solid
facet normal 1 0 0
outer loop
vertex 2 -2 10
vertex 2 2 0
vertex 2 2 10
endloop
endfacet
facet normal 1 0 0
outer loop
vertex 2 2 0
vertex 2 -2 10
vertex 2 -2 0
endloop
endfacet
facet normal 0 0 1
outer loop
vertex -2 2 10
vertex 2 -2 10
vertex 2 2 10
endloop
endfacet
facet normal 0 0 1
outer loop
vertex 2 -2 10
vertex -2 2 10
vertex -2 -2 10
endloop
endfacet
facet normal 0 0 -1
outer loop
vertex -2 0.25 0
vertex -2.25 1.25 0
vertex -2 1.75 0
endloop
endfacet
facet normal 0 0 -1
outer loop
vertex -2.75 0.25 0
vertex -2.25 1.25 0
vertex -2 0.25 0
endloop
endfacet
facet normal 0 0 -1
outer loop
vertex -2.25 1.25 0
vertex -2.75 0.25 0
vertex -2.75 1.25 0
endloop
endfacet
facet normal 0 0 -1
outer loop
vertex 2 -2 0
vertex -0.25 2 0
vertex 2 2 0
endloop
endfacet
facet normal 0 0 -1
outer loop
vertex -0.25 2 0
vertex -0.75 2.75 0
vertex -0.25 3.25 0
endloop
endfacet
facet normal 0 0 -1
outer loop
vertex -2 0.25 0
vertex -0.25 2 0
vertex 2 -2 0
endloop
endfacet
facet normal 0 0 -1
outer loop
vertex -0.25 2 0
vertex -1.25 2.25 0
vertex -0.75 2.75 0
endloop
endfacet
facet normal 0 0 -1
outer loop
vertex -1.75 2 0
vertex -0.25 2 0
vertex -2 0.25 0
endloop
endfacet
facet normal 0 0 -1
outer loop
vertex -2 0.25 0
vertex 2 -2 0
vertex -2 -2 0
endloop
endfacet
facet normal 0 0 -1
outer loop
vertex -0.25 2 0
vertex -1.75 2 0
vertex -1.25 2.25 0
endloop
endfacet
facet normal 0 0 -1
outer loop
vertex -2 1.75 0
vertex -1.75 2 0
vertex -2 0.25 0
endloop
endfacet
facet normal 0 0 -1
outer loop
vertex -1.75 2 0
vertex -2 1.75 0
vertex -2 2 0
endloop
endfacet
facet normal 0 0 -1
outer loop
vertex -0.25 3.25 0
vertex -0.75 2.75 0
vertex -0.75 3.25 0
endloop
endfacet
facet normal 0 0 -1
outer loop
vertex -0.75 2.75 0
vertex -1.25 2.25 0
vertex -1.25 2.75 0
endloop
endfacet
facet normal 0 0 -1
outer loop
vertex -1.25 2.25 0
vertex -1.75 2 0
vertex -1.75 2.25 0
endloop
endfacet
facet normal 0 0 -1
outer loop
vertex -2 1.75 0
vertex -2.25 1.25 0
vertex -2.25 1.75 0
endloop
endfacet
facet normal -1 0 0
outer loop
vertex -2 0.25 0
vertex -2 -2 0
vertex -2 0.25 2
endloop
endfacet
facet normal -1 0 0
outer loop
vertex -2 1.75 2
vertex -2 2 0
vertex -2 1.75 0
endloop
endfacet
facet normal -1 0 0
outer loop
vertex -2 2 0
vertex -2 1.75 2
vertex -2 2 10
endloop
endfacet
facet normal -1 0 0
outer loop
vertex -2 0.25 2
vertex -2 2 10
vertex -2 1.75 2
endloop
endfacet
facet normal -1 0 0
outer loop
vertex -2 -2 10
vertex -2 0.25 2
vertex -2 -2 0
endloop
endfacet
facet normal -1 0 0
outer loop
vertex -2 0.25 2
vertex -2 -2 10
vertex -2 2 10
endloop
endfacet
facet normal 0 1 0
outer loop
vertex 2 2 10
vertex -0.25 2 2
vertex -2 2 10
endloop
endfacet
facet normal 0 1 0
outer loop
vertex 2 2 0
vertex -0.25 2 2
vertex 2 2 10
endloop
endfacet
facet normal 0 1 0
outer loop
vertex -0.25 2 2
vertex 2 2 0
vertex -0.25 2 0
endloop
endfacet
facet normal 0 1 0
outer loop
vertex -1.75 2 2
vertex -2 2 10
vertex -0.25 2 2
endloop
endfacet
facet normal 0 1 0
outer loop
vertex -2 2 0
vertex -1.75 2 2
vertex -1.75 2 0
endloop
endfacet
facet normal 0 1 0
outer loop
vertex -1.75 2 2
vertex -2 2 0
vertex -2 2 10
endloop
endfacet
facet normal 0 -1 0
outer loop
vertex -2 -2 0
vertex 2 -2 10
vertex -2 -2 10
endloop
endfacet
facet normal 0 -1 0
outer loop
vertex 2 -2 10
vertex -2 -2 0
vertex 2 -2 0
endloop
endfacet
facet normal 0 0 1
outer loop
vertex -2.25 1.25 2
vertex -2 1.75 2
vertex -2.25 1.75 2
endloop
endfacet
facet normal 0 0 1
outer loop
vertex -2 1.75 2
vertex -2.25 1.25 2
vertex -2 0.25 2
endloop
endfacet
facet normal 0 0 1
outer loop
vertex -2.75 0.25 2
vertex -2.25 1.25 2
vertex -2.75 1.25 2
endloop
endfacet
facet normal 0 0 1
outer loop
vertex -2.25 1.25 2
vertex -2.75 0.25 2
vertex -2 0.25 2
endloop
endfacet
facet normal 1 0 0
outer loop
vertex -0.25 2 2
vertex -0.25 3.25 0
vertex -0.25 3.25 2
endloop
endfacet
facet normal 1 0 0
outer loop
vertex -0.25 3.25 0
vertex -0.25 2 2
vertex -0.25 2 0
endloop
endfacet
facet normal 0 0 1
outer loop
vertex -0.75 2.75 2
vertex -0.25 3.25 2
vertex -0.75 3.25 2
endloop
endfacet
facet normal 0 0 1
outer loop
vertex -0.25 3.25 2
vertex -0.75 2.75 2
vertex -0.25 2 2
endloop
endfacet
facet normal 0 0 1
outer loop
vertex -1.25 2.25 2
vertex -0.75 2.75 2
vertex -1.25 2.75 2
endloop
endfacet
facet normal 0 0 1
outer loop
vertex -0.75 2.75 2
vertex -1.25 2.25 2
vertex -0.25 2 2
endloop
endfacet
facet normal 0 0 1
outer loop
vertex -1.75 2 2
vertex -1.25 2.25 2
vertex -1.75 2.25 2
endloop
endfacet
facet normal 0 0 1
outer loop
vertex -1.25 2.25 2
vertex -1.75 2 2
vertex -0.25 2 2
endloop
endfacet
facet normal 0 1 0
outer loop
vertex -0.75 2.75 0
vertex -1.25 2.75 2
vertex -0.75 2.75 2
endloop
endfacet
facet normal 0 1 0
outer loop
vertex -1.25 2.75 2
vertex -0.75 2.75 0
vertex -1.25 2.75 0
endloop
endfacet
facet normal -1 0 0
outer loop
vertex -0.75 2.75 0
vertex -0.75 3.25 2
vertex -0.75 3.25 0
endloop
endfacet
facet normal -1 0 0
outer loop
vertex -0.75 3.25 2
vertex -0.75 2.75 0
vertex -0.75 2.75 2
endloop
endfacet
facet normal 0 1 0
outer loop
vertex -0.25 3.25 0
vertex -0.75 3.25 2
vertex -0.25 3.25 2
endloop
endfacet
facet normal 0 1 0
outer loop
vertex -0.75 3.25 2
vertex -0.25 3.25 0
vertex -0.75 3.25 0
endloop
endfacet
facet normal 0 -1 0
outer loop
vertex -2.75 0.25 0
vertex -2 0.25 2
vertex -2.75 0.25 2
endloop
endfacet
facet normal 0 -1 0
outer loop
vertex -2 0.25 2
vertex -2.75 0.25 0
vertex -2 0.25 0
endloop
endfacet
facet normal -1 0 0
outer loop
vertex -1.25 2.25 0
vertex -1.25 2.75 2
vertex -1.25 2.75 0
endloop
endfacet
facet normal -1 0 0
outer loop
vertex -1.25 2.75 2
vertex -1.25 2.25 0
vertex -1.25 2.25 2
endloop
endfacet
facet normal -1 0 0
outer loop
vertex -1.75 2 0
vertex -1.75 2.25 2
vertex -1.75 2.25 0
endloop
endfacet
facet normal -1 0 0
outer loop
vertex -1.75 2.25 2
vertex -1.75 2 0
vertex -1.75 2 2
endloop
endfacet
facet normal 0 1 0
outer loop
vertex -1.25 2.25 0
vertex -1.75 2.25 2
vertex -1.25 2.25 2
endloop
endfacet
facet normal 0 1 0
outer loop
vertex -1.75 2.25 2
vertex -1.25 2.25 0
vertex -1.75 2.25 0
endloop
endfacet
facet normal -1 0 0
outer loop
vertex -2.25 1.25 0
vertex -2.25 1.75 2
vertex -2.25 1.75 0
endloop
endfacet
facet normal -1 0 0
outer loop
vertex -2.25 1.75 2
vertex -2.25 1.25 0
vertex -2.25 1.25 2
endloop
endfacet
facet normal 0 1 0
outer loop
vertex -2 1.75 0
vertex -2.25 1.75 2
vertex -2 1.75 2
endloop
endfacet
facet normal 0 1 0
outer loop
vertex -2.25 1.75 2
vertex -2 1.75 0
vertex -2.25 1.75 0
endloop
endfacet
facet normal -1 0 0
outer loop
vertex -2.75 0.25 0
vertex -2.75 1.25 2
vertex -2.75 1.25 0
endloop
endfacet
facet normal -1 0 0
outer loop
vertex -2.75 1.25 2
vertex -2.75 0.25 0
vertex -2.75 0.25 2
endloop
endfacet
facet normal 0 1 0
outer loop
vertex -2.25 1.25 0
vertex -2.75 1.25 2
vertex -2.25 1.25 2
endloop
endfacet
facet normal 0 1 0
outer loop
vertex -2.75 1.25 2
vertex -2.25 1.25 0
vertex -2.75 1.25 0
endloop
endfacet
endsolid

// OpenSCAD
translate([0, 0, 5]) color([0,1,0,0.9]) cube([4, 4, 10], center=true);
translate([-0.5, 0.5, 1]) color([1,0,0]) cube([0.5, 0.5, 2], center=true);
translate([-0.5, 1.0, 1]) color([1,0,0]) cube([0.5, 0.5, 2], center=true);
translate([-0.5, 1.5, 1]) color([1,0,0]) cube([0.5, 0.5, 2], center=true);
translate([-0.5, 2.0, 1]) color([1,0,0]) cube([0.5, 0.5, 2], center=true);
translate([-0.5, 2.5, 1]) color([1,0,0]) cube([0.5, 0.5, 2], center=true);
translate([-0.5, 3.0, 1]) color([1,0,0]) cube([0.5, 0.5, 2], center=true);
translate([-1.0, 0.5, 1]) color([1,0,0]) cube([0.5, 0.5, 2], center=true);
translate([-1.0, 1.0, 1]) color([1,0,0]) cube([0.5, 0.5, 2], center=true);
translate([-1.0, 1.5, 1]) color([1,0,0]) cube([0.5, 0.5, 2], center=true);
translate([-1.0, 2.0, 1]) color([1,0,0]) cube([0.5, 0.5, 2], center=true);
translate([-1.0, 2.5, 1]) color([1,0,0]) cube([0.5, 0.5, 2], center=true);
translate([-1.5, 0.5, 1]) color([1,0,0]) cube([0.5, 0.5, 2], center=true);
translate([-1.5, 1.0, 1]) color([1,0,0]) cube([0.5, 0.5, 2], center=true);
translate([-1.5, 1.5, 1]) color([1,0,0]) cube([0.5, 0.5, 2], center=true);
translate([-1.5, 2.0, 1]) color([1,0,0]) cube([0.5, 0.5, 2], center=true);
translate([-2.0, 0.5, 1]) color([1,0,0]) cube([0.5, 0.5, 2], center=true);
translate([-2.0, 1.0, 1]) color([1,0,0]) cube([0.5, 0.5, 2], center=true);
translate([-2.0, 1.5, 1]) color([1,0,0]) cube([0.5, 0.5, 2], center=true);
translate([-2.5, 0.5, 1]) color([1,0,0]) cube([0.5, 0.5, 2], center=true);
translate([-2.5, 1.0, 1]) color([1,0,0]) cube([0.5, 0.5, 2], center=true);
